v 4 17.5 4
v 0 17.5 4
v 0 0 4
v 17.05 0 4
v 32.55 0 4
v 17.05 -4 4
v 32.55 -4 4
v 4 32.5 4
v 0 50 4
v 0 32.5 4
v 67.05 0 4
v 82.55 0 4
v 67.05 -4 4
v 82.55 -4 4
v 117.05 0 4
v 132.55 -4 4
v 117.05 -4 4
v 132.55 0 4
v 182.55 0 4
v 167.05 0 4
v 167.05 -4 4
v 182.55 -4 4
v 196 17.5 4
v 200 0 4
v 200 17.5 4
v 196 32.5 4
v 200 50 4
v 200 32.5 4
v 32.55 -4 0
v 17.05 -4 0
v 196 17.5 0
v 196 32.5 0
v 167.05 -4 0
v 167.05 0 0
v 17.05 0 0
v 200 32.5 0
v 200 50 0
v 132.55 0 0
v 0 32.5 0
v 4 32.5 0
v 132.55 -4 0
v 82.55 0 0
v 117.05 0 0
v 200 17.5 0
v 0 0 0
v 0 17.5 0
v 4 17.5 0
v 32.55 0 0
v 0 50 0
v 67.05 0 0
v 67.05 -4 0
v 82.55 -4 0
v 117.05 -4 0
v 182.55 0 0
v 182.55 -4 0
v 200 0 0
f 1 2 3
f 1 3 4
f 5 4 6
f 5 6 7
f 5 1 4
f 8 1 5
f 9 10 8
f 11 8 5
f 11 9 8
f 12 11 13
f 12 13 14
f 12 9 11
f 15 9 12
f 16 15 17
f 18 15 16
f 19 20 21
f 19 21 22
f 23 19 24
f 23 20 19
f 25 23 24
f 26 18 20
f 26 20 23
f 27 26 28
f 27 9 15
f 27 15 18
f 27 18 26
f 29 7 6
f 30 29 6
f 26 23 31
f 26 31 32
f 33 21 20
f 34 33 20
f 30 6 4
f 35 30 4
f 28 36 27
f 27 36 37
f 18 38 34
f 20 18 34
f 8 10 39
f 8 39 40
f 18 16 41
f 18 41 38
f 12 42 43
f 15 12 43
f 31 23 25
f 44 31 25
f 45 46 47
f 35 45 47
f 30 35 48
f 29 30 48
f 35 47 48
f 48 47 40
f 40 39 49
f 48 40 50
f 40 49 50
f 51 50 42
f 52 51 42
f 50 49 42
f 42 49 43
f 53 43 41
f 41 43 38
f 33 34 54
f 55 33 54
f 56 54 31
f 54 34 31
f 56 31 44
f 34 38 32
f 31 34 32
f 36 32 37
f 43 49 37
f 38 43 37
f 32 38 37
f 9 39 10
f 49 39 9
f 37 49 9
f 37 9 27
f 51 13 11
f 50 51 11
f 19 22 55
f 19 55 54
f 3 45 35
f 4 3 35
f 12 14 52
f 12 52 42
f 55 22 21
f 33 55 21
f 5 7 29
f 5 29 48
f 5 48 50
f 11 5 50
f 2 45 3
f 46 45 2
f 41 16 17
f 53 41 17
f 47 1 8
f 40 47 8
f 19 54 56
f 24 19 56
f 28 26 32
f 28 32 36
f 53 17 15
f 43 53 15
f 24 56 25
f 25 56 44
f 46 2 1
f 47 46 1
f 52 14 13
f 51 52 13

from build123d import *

# Parameters (mm, degrees)
SKIZZE1_W                       = 200
SKIZZE1_H                       = 50
AUFSATZ_LINEAR_AUSTRAGEN1_DEPTH = 4
SKIZZE2_W                       = 15.5
SKIZZE2_H                       = 4
AUFSATZ_LINEAR_AUSTRAGEN2_DEPTH = 4
SCHNITT_LINEAR_AUSTRAGEN1_REACH = 6
SKIZZE4_W                       = 4
SKIZZE4_H                       = 15


with BuildPart() as part:
    # Skizze1 → Aufsatz-Linear austragen1 (new body)
    with BuildSketch(Plane.XY):
        with Locations((100, 25)):
            Rectangle(SKIZZE1_W, SKIZZE1_H)
    extrude(amount=AUFSATZ_LINEAR_AUSTRAGEN1_DEPTH)

    # Skizze2 → Aufsatz-Linear austragen2 (add)
    with BuildSketch(Plane(origin=(0, 0, 4), x_dir=(-1, 0, 0), z_dir=(0, 0, -1))):
        with Locations((-174.8, -2)):
            Rectangle(SKIZZE2_W, SKIZZE2_H)
        with Locations((-124.8, -2)):
            Rectangle(SKIZZE2_W, SKIZZE2_H)
        with Locations((-74.8, -2)):
            Rectangle(SKIZZE2_W, SKIZZE2_H)
        with Locations((-24.8, -2)):
            Rectangle(SKIZZE2_W, SKIZZE2_H)
    extrude(amount=AUFSATZ_LINEAR_AUSTRAGEN2_DEPTH)

    # Skizze4 → Schnitt-Linear austragen1 (cut, up to next)
    with BuildSketch(Plane.XY.offset(4), mode=Mode.PRIVATE) as schnitt_linear_austragen1_sk1:
        with Locations((2, 25)):
            Rectangle(SKIZZE4_W, SKIZZE4_H)
    schnitt_linear_austragen1_tool1 = extrude(schnitt_linear_austragen1_sk1.sketch, amount=-SCHNITT_LINEAR_AUSTRAGEN1_REACH, mode=Mode.PRIVATE) & part.part
    add(schnitt_linear_austragen1_tool1.solids().sort_by_distance((2, 25, 4))[0], mode=Mode.SUBTRACT)
    # Skizze4 → Schnitt-Linear austragen1 (cut, up to next)
    with BuildSketch(Plane.XY.offset(4), mode=Mode.PRIVATE) as schnitt_linear_austragen1_sk2:
        with Locations((198, 25)):
            Rectangle(SKIZZE4_W, SKIZZE4_H)
    schnitt_linear_austragen1_tool2 = extrude(schnitt_linear_austragen1_sk2.sketch, amount=-SCHNITT_LINEAR_AUSTRAGEN1_REACH, mode=Mode.PRIVATE) & part.part
    add(schnitt_linear_austragen1_tool2.solids().sort_by_distance((198, 25, 4))[0], mode=Mode.SUBTRACT)


solid = part.part
